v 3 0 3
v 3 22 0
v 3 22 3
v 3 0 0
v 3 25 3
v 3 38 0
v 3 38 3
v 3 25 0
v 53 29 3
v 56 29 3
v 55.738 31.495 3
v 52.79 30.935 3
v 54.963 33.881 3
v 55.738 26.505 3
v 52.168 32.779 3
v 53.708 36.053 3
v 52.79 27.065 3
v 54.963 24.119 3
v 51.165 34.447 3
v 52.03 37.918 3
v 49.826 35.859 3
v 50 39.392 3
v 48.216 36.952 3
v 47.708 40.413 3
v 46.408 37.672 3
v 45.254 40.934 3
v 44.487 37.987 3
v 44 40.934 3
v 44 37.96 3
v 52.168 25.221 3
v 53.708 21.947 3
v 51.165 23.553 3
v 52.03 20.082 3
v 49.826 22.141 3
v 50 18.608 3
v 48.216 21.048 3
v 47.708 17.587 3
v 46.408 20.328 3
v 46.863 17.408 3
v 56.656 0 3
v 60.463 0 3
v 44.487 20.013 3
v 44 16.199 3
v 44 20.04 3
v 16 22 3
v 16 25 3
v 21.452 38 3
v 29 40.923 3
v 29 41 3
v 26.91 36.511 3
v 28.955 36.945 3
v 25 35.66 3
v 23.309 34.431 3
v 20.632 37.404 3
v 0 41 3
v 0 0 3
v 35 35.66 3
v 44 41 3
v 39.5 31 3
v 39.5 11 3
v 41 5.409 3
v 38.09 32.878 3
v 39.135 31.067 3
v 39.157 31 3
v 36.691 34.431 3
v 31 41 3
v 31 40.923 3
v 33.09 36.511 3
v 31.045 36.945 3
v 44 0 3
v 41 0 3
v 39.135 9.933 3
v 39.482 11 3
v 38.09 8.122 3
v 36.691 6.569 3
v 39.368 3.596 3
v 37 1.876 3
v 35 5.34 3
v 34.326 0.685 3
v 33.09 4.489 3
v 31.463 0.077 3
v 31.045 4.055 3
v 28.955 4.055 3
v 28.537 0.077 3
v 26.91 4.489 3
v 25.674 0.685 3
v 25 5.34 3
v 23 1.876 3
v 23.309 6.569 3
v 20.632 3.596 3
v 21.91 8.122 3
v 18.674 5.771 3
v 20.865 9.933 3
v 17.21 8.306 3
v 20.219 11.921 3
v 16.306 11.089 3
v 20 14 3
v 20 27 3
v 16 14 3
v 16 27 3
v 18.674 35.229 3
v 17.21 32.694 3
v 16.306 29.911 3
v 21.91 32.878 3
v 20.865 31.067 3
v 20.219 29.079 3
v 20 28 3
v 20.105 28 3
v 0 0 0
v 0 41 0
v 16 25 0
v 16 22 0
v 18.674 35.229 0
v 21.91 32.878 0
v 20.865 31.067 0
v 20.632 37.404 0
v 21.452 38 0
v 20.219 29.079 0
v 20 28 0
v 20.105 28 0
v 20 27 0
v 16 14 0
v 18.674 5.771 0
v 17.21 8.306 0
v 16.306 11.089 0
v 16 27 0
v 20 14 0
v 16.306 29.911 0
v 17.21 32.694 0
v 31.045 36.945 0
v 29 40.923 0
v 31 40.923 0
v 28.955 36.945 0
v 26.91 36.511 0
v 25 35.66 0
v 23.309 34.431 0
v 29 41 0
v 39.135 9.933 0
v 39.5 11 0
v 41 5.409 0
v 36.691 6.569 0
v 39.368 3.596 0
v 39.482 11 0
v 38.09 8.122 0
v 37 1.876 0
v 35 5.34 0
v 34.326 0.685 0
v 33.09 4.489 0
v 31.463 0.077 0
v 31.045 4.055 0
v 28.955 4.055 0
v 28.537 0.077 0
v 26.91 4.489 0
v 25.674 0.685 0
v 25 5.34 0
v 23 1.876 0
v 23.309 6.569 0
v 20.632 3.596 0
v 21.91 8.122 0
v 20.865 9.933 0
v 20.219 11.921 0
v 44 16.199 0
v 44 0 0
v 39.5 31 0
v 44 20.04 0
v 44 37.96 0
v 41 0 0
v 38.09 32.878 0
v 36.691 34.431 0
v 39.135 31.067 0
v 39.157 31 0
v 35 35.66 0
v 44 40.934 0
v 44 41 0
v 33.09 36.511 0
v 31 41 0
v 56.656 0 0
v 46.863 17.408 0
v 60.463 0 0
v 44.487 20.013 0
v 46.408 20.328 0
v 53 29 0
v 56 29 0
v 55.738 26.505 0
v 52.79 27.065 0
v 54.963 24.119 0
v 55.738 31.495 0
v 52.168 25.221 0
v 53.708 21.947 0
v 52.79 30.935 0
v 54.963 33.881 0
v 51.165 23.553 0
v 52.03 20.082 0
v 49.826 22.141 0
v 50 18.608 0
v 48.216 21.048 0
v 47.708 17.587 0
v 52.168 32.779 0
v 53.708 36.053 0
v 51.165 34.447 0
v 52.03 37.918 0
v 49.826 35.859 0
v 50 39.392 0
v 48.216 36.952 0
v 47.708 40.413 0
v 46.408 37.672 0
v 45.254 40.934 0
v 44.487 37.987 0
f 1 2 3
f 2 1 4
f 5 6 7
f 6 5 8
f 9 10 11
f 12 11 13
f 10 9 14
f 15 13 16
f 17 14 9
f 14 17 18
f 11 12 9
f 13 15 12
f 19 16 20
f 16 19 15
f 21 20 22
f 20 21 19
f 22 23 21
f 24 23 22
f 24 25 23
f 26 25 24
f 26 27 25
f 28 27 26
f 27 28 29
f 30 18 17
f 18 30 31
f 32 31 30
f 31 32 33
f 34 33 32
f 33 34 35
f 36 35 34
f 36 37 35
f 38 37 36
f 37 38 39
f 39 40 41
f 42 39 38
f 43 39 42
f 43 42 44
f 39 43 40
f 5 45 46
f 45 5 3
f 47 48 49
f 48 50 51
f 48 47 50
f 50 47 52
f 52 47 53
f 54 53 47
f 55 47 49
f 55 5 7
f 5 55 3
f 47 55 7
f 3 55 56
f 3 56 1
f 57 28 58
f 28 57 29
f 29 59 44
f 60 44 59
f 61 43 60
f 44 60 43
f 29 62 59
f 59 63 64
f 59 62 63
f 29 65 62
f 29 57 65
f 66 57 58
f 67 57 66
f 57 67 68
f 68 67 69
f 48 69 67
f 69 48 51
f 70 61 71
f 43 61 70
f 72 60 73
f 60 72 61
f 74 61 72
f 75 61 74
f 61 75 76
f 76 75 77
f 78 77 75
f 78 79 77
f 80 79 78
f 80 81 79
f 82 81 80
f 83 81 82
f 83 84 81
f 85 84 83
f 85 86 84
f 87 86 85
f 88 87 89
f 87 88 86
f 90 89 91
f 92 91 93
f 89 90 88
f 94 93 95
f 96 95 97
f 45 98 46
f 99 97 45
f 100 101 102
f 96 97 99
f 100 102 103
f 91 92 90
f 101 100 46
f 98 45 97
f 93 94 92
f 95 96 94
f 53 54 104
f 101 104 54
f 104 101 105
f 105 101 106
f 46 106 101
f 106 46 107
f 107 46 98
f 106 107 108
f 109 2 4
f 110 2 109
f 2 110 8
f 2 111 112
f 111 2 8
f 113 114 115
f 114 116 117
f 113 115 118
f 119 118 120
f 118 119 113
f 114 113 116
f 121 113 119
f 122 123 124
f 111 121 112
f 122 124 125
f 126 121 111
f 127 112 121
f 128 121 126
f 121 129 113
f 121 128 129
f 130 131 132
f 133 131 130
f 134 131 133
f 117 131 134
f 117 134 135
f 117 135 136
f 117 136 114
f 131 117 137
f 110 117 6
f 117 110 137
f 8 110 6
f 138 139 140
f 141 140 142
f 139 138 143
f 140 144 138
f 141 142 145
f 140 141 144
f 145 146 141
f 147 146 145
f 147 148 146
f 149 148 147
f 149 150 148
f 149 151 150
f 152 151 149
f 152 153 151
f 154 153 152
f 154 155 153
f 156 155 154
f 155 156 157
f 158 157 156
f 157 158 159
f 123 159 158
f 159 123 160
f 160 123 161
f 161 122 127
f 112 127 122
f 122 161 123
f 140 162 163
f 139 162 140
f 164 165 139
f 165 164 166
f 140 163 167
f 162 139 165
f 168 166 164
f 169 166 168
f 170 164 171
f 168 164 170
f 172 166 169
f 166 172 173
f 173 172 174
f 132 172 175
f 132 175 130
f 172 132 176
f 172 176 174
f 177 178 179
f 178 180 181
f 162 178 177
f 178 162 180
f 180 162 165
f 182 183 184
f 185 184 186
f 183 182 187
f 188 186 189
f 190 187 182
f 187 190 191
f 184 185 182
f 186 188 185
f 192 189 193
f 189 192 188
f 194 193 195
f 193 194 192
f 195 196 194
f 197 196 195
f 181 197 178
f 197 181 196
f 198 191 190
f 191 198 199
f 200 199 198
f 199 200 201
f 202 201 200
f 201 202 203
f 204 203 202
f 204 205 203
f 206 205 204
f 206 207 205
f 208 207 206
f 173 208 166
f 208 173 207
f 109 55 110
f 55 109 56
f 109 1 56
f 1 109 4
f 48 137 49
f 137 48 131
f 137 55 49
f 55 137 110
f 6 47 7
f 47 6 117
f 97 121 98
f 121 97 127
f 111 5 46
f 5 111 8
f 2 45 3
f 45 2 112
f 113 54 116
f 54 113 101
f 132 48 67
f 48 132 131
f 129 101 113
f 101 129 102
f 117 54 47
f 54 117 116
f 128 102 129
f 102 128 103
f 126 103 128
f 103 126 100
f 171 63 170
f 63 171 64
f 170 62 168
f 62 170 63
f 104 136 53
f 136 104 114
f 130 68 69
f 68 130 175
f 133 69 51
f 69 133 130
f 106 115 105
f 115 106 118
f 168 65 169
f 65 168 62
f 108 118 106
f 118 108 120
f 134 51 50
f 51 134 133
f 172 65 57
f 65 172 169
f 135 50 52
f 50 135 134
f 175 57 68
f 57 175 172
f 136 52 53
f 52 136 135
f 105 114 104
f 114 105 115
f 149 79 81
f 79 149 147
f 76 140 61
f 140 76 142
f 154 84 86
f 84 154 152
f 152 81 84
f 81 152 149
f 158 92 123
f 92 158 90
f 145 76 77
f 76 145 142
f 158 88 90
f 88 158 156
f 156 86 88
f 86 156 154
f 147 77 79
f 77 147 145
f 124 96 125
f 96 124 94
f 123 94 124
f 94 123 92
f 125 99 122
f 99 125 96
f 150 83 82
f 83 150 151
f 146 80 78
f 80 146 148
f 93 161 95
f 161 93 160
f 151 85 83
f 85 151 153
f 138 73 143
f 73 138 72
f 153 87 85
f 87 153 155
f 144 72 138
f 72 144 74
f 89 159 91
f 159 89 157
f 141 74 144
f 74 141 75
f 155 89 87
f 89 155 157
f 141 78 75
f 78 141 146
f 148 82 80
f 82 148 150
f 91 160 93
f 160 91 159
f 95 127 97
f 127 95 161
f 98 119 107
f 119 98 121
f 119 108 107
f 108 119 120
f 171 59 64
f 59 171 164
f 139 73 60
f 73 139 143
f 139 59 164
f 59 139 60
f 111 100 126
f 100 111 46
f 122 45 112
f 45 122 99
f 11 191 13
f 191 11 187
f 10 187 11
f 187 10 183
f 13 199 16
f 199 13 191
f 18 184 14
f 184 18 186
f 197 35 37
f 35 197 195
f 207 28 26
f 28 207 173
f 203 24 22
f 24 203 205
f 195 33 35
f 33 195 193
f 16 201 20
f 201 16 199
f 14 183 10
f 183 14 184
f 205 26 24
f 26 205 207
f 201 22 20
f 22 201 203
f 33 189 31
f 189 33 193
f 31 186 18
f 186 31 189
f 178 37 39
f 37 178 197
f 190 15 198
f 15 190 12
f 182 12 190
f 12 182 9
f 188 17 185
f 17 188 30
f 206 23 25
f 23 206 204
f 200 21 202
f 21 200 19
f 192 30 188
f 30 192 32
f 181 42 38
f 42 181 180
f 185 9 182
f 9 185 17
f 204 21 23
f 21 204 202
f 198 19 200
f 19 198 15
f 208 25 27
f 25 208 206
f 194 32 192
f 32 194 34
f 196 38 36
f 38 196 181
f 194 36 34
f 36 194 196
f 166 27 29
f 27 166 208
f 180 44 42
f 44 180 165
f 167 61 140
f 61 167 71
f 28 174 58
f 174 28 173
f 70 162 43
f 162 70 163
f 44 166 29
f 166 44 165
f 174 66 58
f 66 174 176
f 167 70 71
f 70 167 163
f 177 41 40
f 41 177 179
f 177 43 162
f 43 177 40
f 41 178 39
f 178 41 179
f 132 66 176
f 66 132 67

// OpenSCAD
//F

 union(){
  cube([3,40,3]);
  translate([0,38,0]) cube([29,3,3]);
  translate([0,22,0]) cube([20,3,3]);

}

// буква О
translate([-10,1,0])
union(){
  translate([49.5,10,0]) cube([4,20,3]);
  translate([26,13,0]) cube([4,13,3]);
difference(){
union(){
	
  difference(){
  translate([40,26,0]) cylinder(3,14,14);
  translate([40,26,-1]) cylinder(5,10,10);
  translate([33,10,-1]) cube([20,10,5]);

}

difference(){
  translate([40,13,0]) cylinder(3,14,14);
  translate([40,13,-1]) cylinder(5,10,10);
  translate([32,17,-1]) cube([19,10,5]);
  translate([40,17,-1]) cube(20);
}
}
  translate([30,13,-1]) cube([5,14,5]);
  translate([42,10,-1]) cube(20);
}
}

//R
 translate([41,0,0])
union(){
difference(){
  union(){
  cube([3,41,3]);
difference(){
  translate([3,29,0]) cylinder(3,12,12);
  translate([3,29,-1]) cylinder(5,9,9);
  translate([-15,5,-1]) cube([15,40,5]);
}
translate([18,-3,0]) rotate([0,0,38]) cube([3,26,3]);
}
  translate([0,-13,-1]) cube([40,13,5]);

}
 translate([-10,37,0]) cube([12,4,3]);
 translate([-2,35,0]) cube([4,4,3]);
}
